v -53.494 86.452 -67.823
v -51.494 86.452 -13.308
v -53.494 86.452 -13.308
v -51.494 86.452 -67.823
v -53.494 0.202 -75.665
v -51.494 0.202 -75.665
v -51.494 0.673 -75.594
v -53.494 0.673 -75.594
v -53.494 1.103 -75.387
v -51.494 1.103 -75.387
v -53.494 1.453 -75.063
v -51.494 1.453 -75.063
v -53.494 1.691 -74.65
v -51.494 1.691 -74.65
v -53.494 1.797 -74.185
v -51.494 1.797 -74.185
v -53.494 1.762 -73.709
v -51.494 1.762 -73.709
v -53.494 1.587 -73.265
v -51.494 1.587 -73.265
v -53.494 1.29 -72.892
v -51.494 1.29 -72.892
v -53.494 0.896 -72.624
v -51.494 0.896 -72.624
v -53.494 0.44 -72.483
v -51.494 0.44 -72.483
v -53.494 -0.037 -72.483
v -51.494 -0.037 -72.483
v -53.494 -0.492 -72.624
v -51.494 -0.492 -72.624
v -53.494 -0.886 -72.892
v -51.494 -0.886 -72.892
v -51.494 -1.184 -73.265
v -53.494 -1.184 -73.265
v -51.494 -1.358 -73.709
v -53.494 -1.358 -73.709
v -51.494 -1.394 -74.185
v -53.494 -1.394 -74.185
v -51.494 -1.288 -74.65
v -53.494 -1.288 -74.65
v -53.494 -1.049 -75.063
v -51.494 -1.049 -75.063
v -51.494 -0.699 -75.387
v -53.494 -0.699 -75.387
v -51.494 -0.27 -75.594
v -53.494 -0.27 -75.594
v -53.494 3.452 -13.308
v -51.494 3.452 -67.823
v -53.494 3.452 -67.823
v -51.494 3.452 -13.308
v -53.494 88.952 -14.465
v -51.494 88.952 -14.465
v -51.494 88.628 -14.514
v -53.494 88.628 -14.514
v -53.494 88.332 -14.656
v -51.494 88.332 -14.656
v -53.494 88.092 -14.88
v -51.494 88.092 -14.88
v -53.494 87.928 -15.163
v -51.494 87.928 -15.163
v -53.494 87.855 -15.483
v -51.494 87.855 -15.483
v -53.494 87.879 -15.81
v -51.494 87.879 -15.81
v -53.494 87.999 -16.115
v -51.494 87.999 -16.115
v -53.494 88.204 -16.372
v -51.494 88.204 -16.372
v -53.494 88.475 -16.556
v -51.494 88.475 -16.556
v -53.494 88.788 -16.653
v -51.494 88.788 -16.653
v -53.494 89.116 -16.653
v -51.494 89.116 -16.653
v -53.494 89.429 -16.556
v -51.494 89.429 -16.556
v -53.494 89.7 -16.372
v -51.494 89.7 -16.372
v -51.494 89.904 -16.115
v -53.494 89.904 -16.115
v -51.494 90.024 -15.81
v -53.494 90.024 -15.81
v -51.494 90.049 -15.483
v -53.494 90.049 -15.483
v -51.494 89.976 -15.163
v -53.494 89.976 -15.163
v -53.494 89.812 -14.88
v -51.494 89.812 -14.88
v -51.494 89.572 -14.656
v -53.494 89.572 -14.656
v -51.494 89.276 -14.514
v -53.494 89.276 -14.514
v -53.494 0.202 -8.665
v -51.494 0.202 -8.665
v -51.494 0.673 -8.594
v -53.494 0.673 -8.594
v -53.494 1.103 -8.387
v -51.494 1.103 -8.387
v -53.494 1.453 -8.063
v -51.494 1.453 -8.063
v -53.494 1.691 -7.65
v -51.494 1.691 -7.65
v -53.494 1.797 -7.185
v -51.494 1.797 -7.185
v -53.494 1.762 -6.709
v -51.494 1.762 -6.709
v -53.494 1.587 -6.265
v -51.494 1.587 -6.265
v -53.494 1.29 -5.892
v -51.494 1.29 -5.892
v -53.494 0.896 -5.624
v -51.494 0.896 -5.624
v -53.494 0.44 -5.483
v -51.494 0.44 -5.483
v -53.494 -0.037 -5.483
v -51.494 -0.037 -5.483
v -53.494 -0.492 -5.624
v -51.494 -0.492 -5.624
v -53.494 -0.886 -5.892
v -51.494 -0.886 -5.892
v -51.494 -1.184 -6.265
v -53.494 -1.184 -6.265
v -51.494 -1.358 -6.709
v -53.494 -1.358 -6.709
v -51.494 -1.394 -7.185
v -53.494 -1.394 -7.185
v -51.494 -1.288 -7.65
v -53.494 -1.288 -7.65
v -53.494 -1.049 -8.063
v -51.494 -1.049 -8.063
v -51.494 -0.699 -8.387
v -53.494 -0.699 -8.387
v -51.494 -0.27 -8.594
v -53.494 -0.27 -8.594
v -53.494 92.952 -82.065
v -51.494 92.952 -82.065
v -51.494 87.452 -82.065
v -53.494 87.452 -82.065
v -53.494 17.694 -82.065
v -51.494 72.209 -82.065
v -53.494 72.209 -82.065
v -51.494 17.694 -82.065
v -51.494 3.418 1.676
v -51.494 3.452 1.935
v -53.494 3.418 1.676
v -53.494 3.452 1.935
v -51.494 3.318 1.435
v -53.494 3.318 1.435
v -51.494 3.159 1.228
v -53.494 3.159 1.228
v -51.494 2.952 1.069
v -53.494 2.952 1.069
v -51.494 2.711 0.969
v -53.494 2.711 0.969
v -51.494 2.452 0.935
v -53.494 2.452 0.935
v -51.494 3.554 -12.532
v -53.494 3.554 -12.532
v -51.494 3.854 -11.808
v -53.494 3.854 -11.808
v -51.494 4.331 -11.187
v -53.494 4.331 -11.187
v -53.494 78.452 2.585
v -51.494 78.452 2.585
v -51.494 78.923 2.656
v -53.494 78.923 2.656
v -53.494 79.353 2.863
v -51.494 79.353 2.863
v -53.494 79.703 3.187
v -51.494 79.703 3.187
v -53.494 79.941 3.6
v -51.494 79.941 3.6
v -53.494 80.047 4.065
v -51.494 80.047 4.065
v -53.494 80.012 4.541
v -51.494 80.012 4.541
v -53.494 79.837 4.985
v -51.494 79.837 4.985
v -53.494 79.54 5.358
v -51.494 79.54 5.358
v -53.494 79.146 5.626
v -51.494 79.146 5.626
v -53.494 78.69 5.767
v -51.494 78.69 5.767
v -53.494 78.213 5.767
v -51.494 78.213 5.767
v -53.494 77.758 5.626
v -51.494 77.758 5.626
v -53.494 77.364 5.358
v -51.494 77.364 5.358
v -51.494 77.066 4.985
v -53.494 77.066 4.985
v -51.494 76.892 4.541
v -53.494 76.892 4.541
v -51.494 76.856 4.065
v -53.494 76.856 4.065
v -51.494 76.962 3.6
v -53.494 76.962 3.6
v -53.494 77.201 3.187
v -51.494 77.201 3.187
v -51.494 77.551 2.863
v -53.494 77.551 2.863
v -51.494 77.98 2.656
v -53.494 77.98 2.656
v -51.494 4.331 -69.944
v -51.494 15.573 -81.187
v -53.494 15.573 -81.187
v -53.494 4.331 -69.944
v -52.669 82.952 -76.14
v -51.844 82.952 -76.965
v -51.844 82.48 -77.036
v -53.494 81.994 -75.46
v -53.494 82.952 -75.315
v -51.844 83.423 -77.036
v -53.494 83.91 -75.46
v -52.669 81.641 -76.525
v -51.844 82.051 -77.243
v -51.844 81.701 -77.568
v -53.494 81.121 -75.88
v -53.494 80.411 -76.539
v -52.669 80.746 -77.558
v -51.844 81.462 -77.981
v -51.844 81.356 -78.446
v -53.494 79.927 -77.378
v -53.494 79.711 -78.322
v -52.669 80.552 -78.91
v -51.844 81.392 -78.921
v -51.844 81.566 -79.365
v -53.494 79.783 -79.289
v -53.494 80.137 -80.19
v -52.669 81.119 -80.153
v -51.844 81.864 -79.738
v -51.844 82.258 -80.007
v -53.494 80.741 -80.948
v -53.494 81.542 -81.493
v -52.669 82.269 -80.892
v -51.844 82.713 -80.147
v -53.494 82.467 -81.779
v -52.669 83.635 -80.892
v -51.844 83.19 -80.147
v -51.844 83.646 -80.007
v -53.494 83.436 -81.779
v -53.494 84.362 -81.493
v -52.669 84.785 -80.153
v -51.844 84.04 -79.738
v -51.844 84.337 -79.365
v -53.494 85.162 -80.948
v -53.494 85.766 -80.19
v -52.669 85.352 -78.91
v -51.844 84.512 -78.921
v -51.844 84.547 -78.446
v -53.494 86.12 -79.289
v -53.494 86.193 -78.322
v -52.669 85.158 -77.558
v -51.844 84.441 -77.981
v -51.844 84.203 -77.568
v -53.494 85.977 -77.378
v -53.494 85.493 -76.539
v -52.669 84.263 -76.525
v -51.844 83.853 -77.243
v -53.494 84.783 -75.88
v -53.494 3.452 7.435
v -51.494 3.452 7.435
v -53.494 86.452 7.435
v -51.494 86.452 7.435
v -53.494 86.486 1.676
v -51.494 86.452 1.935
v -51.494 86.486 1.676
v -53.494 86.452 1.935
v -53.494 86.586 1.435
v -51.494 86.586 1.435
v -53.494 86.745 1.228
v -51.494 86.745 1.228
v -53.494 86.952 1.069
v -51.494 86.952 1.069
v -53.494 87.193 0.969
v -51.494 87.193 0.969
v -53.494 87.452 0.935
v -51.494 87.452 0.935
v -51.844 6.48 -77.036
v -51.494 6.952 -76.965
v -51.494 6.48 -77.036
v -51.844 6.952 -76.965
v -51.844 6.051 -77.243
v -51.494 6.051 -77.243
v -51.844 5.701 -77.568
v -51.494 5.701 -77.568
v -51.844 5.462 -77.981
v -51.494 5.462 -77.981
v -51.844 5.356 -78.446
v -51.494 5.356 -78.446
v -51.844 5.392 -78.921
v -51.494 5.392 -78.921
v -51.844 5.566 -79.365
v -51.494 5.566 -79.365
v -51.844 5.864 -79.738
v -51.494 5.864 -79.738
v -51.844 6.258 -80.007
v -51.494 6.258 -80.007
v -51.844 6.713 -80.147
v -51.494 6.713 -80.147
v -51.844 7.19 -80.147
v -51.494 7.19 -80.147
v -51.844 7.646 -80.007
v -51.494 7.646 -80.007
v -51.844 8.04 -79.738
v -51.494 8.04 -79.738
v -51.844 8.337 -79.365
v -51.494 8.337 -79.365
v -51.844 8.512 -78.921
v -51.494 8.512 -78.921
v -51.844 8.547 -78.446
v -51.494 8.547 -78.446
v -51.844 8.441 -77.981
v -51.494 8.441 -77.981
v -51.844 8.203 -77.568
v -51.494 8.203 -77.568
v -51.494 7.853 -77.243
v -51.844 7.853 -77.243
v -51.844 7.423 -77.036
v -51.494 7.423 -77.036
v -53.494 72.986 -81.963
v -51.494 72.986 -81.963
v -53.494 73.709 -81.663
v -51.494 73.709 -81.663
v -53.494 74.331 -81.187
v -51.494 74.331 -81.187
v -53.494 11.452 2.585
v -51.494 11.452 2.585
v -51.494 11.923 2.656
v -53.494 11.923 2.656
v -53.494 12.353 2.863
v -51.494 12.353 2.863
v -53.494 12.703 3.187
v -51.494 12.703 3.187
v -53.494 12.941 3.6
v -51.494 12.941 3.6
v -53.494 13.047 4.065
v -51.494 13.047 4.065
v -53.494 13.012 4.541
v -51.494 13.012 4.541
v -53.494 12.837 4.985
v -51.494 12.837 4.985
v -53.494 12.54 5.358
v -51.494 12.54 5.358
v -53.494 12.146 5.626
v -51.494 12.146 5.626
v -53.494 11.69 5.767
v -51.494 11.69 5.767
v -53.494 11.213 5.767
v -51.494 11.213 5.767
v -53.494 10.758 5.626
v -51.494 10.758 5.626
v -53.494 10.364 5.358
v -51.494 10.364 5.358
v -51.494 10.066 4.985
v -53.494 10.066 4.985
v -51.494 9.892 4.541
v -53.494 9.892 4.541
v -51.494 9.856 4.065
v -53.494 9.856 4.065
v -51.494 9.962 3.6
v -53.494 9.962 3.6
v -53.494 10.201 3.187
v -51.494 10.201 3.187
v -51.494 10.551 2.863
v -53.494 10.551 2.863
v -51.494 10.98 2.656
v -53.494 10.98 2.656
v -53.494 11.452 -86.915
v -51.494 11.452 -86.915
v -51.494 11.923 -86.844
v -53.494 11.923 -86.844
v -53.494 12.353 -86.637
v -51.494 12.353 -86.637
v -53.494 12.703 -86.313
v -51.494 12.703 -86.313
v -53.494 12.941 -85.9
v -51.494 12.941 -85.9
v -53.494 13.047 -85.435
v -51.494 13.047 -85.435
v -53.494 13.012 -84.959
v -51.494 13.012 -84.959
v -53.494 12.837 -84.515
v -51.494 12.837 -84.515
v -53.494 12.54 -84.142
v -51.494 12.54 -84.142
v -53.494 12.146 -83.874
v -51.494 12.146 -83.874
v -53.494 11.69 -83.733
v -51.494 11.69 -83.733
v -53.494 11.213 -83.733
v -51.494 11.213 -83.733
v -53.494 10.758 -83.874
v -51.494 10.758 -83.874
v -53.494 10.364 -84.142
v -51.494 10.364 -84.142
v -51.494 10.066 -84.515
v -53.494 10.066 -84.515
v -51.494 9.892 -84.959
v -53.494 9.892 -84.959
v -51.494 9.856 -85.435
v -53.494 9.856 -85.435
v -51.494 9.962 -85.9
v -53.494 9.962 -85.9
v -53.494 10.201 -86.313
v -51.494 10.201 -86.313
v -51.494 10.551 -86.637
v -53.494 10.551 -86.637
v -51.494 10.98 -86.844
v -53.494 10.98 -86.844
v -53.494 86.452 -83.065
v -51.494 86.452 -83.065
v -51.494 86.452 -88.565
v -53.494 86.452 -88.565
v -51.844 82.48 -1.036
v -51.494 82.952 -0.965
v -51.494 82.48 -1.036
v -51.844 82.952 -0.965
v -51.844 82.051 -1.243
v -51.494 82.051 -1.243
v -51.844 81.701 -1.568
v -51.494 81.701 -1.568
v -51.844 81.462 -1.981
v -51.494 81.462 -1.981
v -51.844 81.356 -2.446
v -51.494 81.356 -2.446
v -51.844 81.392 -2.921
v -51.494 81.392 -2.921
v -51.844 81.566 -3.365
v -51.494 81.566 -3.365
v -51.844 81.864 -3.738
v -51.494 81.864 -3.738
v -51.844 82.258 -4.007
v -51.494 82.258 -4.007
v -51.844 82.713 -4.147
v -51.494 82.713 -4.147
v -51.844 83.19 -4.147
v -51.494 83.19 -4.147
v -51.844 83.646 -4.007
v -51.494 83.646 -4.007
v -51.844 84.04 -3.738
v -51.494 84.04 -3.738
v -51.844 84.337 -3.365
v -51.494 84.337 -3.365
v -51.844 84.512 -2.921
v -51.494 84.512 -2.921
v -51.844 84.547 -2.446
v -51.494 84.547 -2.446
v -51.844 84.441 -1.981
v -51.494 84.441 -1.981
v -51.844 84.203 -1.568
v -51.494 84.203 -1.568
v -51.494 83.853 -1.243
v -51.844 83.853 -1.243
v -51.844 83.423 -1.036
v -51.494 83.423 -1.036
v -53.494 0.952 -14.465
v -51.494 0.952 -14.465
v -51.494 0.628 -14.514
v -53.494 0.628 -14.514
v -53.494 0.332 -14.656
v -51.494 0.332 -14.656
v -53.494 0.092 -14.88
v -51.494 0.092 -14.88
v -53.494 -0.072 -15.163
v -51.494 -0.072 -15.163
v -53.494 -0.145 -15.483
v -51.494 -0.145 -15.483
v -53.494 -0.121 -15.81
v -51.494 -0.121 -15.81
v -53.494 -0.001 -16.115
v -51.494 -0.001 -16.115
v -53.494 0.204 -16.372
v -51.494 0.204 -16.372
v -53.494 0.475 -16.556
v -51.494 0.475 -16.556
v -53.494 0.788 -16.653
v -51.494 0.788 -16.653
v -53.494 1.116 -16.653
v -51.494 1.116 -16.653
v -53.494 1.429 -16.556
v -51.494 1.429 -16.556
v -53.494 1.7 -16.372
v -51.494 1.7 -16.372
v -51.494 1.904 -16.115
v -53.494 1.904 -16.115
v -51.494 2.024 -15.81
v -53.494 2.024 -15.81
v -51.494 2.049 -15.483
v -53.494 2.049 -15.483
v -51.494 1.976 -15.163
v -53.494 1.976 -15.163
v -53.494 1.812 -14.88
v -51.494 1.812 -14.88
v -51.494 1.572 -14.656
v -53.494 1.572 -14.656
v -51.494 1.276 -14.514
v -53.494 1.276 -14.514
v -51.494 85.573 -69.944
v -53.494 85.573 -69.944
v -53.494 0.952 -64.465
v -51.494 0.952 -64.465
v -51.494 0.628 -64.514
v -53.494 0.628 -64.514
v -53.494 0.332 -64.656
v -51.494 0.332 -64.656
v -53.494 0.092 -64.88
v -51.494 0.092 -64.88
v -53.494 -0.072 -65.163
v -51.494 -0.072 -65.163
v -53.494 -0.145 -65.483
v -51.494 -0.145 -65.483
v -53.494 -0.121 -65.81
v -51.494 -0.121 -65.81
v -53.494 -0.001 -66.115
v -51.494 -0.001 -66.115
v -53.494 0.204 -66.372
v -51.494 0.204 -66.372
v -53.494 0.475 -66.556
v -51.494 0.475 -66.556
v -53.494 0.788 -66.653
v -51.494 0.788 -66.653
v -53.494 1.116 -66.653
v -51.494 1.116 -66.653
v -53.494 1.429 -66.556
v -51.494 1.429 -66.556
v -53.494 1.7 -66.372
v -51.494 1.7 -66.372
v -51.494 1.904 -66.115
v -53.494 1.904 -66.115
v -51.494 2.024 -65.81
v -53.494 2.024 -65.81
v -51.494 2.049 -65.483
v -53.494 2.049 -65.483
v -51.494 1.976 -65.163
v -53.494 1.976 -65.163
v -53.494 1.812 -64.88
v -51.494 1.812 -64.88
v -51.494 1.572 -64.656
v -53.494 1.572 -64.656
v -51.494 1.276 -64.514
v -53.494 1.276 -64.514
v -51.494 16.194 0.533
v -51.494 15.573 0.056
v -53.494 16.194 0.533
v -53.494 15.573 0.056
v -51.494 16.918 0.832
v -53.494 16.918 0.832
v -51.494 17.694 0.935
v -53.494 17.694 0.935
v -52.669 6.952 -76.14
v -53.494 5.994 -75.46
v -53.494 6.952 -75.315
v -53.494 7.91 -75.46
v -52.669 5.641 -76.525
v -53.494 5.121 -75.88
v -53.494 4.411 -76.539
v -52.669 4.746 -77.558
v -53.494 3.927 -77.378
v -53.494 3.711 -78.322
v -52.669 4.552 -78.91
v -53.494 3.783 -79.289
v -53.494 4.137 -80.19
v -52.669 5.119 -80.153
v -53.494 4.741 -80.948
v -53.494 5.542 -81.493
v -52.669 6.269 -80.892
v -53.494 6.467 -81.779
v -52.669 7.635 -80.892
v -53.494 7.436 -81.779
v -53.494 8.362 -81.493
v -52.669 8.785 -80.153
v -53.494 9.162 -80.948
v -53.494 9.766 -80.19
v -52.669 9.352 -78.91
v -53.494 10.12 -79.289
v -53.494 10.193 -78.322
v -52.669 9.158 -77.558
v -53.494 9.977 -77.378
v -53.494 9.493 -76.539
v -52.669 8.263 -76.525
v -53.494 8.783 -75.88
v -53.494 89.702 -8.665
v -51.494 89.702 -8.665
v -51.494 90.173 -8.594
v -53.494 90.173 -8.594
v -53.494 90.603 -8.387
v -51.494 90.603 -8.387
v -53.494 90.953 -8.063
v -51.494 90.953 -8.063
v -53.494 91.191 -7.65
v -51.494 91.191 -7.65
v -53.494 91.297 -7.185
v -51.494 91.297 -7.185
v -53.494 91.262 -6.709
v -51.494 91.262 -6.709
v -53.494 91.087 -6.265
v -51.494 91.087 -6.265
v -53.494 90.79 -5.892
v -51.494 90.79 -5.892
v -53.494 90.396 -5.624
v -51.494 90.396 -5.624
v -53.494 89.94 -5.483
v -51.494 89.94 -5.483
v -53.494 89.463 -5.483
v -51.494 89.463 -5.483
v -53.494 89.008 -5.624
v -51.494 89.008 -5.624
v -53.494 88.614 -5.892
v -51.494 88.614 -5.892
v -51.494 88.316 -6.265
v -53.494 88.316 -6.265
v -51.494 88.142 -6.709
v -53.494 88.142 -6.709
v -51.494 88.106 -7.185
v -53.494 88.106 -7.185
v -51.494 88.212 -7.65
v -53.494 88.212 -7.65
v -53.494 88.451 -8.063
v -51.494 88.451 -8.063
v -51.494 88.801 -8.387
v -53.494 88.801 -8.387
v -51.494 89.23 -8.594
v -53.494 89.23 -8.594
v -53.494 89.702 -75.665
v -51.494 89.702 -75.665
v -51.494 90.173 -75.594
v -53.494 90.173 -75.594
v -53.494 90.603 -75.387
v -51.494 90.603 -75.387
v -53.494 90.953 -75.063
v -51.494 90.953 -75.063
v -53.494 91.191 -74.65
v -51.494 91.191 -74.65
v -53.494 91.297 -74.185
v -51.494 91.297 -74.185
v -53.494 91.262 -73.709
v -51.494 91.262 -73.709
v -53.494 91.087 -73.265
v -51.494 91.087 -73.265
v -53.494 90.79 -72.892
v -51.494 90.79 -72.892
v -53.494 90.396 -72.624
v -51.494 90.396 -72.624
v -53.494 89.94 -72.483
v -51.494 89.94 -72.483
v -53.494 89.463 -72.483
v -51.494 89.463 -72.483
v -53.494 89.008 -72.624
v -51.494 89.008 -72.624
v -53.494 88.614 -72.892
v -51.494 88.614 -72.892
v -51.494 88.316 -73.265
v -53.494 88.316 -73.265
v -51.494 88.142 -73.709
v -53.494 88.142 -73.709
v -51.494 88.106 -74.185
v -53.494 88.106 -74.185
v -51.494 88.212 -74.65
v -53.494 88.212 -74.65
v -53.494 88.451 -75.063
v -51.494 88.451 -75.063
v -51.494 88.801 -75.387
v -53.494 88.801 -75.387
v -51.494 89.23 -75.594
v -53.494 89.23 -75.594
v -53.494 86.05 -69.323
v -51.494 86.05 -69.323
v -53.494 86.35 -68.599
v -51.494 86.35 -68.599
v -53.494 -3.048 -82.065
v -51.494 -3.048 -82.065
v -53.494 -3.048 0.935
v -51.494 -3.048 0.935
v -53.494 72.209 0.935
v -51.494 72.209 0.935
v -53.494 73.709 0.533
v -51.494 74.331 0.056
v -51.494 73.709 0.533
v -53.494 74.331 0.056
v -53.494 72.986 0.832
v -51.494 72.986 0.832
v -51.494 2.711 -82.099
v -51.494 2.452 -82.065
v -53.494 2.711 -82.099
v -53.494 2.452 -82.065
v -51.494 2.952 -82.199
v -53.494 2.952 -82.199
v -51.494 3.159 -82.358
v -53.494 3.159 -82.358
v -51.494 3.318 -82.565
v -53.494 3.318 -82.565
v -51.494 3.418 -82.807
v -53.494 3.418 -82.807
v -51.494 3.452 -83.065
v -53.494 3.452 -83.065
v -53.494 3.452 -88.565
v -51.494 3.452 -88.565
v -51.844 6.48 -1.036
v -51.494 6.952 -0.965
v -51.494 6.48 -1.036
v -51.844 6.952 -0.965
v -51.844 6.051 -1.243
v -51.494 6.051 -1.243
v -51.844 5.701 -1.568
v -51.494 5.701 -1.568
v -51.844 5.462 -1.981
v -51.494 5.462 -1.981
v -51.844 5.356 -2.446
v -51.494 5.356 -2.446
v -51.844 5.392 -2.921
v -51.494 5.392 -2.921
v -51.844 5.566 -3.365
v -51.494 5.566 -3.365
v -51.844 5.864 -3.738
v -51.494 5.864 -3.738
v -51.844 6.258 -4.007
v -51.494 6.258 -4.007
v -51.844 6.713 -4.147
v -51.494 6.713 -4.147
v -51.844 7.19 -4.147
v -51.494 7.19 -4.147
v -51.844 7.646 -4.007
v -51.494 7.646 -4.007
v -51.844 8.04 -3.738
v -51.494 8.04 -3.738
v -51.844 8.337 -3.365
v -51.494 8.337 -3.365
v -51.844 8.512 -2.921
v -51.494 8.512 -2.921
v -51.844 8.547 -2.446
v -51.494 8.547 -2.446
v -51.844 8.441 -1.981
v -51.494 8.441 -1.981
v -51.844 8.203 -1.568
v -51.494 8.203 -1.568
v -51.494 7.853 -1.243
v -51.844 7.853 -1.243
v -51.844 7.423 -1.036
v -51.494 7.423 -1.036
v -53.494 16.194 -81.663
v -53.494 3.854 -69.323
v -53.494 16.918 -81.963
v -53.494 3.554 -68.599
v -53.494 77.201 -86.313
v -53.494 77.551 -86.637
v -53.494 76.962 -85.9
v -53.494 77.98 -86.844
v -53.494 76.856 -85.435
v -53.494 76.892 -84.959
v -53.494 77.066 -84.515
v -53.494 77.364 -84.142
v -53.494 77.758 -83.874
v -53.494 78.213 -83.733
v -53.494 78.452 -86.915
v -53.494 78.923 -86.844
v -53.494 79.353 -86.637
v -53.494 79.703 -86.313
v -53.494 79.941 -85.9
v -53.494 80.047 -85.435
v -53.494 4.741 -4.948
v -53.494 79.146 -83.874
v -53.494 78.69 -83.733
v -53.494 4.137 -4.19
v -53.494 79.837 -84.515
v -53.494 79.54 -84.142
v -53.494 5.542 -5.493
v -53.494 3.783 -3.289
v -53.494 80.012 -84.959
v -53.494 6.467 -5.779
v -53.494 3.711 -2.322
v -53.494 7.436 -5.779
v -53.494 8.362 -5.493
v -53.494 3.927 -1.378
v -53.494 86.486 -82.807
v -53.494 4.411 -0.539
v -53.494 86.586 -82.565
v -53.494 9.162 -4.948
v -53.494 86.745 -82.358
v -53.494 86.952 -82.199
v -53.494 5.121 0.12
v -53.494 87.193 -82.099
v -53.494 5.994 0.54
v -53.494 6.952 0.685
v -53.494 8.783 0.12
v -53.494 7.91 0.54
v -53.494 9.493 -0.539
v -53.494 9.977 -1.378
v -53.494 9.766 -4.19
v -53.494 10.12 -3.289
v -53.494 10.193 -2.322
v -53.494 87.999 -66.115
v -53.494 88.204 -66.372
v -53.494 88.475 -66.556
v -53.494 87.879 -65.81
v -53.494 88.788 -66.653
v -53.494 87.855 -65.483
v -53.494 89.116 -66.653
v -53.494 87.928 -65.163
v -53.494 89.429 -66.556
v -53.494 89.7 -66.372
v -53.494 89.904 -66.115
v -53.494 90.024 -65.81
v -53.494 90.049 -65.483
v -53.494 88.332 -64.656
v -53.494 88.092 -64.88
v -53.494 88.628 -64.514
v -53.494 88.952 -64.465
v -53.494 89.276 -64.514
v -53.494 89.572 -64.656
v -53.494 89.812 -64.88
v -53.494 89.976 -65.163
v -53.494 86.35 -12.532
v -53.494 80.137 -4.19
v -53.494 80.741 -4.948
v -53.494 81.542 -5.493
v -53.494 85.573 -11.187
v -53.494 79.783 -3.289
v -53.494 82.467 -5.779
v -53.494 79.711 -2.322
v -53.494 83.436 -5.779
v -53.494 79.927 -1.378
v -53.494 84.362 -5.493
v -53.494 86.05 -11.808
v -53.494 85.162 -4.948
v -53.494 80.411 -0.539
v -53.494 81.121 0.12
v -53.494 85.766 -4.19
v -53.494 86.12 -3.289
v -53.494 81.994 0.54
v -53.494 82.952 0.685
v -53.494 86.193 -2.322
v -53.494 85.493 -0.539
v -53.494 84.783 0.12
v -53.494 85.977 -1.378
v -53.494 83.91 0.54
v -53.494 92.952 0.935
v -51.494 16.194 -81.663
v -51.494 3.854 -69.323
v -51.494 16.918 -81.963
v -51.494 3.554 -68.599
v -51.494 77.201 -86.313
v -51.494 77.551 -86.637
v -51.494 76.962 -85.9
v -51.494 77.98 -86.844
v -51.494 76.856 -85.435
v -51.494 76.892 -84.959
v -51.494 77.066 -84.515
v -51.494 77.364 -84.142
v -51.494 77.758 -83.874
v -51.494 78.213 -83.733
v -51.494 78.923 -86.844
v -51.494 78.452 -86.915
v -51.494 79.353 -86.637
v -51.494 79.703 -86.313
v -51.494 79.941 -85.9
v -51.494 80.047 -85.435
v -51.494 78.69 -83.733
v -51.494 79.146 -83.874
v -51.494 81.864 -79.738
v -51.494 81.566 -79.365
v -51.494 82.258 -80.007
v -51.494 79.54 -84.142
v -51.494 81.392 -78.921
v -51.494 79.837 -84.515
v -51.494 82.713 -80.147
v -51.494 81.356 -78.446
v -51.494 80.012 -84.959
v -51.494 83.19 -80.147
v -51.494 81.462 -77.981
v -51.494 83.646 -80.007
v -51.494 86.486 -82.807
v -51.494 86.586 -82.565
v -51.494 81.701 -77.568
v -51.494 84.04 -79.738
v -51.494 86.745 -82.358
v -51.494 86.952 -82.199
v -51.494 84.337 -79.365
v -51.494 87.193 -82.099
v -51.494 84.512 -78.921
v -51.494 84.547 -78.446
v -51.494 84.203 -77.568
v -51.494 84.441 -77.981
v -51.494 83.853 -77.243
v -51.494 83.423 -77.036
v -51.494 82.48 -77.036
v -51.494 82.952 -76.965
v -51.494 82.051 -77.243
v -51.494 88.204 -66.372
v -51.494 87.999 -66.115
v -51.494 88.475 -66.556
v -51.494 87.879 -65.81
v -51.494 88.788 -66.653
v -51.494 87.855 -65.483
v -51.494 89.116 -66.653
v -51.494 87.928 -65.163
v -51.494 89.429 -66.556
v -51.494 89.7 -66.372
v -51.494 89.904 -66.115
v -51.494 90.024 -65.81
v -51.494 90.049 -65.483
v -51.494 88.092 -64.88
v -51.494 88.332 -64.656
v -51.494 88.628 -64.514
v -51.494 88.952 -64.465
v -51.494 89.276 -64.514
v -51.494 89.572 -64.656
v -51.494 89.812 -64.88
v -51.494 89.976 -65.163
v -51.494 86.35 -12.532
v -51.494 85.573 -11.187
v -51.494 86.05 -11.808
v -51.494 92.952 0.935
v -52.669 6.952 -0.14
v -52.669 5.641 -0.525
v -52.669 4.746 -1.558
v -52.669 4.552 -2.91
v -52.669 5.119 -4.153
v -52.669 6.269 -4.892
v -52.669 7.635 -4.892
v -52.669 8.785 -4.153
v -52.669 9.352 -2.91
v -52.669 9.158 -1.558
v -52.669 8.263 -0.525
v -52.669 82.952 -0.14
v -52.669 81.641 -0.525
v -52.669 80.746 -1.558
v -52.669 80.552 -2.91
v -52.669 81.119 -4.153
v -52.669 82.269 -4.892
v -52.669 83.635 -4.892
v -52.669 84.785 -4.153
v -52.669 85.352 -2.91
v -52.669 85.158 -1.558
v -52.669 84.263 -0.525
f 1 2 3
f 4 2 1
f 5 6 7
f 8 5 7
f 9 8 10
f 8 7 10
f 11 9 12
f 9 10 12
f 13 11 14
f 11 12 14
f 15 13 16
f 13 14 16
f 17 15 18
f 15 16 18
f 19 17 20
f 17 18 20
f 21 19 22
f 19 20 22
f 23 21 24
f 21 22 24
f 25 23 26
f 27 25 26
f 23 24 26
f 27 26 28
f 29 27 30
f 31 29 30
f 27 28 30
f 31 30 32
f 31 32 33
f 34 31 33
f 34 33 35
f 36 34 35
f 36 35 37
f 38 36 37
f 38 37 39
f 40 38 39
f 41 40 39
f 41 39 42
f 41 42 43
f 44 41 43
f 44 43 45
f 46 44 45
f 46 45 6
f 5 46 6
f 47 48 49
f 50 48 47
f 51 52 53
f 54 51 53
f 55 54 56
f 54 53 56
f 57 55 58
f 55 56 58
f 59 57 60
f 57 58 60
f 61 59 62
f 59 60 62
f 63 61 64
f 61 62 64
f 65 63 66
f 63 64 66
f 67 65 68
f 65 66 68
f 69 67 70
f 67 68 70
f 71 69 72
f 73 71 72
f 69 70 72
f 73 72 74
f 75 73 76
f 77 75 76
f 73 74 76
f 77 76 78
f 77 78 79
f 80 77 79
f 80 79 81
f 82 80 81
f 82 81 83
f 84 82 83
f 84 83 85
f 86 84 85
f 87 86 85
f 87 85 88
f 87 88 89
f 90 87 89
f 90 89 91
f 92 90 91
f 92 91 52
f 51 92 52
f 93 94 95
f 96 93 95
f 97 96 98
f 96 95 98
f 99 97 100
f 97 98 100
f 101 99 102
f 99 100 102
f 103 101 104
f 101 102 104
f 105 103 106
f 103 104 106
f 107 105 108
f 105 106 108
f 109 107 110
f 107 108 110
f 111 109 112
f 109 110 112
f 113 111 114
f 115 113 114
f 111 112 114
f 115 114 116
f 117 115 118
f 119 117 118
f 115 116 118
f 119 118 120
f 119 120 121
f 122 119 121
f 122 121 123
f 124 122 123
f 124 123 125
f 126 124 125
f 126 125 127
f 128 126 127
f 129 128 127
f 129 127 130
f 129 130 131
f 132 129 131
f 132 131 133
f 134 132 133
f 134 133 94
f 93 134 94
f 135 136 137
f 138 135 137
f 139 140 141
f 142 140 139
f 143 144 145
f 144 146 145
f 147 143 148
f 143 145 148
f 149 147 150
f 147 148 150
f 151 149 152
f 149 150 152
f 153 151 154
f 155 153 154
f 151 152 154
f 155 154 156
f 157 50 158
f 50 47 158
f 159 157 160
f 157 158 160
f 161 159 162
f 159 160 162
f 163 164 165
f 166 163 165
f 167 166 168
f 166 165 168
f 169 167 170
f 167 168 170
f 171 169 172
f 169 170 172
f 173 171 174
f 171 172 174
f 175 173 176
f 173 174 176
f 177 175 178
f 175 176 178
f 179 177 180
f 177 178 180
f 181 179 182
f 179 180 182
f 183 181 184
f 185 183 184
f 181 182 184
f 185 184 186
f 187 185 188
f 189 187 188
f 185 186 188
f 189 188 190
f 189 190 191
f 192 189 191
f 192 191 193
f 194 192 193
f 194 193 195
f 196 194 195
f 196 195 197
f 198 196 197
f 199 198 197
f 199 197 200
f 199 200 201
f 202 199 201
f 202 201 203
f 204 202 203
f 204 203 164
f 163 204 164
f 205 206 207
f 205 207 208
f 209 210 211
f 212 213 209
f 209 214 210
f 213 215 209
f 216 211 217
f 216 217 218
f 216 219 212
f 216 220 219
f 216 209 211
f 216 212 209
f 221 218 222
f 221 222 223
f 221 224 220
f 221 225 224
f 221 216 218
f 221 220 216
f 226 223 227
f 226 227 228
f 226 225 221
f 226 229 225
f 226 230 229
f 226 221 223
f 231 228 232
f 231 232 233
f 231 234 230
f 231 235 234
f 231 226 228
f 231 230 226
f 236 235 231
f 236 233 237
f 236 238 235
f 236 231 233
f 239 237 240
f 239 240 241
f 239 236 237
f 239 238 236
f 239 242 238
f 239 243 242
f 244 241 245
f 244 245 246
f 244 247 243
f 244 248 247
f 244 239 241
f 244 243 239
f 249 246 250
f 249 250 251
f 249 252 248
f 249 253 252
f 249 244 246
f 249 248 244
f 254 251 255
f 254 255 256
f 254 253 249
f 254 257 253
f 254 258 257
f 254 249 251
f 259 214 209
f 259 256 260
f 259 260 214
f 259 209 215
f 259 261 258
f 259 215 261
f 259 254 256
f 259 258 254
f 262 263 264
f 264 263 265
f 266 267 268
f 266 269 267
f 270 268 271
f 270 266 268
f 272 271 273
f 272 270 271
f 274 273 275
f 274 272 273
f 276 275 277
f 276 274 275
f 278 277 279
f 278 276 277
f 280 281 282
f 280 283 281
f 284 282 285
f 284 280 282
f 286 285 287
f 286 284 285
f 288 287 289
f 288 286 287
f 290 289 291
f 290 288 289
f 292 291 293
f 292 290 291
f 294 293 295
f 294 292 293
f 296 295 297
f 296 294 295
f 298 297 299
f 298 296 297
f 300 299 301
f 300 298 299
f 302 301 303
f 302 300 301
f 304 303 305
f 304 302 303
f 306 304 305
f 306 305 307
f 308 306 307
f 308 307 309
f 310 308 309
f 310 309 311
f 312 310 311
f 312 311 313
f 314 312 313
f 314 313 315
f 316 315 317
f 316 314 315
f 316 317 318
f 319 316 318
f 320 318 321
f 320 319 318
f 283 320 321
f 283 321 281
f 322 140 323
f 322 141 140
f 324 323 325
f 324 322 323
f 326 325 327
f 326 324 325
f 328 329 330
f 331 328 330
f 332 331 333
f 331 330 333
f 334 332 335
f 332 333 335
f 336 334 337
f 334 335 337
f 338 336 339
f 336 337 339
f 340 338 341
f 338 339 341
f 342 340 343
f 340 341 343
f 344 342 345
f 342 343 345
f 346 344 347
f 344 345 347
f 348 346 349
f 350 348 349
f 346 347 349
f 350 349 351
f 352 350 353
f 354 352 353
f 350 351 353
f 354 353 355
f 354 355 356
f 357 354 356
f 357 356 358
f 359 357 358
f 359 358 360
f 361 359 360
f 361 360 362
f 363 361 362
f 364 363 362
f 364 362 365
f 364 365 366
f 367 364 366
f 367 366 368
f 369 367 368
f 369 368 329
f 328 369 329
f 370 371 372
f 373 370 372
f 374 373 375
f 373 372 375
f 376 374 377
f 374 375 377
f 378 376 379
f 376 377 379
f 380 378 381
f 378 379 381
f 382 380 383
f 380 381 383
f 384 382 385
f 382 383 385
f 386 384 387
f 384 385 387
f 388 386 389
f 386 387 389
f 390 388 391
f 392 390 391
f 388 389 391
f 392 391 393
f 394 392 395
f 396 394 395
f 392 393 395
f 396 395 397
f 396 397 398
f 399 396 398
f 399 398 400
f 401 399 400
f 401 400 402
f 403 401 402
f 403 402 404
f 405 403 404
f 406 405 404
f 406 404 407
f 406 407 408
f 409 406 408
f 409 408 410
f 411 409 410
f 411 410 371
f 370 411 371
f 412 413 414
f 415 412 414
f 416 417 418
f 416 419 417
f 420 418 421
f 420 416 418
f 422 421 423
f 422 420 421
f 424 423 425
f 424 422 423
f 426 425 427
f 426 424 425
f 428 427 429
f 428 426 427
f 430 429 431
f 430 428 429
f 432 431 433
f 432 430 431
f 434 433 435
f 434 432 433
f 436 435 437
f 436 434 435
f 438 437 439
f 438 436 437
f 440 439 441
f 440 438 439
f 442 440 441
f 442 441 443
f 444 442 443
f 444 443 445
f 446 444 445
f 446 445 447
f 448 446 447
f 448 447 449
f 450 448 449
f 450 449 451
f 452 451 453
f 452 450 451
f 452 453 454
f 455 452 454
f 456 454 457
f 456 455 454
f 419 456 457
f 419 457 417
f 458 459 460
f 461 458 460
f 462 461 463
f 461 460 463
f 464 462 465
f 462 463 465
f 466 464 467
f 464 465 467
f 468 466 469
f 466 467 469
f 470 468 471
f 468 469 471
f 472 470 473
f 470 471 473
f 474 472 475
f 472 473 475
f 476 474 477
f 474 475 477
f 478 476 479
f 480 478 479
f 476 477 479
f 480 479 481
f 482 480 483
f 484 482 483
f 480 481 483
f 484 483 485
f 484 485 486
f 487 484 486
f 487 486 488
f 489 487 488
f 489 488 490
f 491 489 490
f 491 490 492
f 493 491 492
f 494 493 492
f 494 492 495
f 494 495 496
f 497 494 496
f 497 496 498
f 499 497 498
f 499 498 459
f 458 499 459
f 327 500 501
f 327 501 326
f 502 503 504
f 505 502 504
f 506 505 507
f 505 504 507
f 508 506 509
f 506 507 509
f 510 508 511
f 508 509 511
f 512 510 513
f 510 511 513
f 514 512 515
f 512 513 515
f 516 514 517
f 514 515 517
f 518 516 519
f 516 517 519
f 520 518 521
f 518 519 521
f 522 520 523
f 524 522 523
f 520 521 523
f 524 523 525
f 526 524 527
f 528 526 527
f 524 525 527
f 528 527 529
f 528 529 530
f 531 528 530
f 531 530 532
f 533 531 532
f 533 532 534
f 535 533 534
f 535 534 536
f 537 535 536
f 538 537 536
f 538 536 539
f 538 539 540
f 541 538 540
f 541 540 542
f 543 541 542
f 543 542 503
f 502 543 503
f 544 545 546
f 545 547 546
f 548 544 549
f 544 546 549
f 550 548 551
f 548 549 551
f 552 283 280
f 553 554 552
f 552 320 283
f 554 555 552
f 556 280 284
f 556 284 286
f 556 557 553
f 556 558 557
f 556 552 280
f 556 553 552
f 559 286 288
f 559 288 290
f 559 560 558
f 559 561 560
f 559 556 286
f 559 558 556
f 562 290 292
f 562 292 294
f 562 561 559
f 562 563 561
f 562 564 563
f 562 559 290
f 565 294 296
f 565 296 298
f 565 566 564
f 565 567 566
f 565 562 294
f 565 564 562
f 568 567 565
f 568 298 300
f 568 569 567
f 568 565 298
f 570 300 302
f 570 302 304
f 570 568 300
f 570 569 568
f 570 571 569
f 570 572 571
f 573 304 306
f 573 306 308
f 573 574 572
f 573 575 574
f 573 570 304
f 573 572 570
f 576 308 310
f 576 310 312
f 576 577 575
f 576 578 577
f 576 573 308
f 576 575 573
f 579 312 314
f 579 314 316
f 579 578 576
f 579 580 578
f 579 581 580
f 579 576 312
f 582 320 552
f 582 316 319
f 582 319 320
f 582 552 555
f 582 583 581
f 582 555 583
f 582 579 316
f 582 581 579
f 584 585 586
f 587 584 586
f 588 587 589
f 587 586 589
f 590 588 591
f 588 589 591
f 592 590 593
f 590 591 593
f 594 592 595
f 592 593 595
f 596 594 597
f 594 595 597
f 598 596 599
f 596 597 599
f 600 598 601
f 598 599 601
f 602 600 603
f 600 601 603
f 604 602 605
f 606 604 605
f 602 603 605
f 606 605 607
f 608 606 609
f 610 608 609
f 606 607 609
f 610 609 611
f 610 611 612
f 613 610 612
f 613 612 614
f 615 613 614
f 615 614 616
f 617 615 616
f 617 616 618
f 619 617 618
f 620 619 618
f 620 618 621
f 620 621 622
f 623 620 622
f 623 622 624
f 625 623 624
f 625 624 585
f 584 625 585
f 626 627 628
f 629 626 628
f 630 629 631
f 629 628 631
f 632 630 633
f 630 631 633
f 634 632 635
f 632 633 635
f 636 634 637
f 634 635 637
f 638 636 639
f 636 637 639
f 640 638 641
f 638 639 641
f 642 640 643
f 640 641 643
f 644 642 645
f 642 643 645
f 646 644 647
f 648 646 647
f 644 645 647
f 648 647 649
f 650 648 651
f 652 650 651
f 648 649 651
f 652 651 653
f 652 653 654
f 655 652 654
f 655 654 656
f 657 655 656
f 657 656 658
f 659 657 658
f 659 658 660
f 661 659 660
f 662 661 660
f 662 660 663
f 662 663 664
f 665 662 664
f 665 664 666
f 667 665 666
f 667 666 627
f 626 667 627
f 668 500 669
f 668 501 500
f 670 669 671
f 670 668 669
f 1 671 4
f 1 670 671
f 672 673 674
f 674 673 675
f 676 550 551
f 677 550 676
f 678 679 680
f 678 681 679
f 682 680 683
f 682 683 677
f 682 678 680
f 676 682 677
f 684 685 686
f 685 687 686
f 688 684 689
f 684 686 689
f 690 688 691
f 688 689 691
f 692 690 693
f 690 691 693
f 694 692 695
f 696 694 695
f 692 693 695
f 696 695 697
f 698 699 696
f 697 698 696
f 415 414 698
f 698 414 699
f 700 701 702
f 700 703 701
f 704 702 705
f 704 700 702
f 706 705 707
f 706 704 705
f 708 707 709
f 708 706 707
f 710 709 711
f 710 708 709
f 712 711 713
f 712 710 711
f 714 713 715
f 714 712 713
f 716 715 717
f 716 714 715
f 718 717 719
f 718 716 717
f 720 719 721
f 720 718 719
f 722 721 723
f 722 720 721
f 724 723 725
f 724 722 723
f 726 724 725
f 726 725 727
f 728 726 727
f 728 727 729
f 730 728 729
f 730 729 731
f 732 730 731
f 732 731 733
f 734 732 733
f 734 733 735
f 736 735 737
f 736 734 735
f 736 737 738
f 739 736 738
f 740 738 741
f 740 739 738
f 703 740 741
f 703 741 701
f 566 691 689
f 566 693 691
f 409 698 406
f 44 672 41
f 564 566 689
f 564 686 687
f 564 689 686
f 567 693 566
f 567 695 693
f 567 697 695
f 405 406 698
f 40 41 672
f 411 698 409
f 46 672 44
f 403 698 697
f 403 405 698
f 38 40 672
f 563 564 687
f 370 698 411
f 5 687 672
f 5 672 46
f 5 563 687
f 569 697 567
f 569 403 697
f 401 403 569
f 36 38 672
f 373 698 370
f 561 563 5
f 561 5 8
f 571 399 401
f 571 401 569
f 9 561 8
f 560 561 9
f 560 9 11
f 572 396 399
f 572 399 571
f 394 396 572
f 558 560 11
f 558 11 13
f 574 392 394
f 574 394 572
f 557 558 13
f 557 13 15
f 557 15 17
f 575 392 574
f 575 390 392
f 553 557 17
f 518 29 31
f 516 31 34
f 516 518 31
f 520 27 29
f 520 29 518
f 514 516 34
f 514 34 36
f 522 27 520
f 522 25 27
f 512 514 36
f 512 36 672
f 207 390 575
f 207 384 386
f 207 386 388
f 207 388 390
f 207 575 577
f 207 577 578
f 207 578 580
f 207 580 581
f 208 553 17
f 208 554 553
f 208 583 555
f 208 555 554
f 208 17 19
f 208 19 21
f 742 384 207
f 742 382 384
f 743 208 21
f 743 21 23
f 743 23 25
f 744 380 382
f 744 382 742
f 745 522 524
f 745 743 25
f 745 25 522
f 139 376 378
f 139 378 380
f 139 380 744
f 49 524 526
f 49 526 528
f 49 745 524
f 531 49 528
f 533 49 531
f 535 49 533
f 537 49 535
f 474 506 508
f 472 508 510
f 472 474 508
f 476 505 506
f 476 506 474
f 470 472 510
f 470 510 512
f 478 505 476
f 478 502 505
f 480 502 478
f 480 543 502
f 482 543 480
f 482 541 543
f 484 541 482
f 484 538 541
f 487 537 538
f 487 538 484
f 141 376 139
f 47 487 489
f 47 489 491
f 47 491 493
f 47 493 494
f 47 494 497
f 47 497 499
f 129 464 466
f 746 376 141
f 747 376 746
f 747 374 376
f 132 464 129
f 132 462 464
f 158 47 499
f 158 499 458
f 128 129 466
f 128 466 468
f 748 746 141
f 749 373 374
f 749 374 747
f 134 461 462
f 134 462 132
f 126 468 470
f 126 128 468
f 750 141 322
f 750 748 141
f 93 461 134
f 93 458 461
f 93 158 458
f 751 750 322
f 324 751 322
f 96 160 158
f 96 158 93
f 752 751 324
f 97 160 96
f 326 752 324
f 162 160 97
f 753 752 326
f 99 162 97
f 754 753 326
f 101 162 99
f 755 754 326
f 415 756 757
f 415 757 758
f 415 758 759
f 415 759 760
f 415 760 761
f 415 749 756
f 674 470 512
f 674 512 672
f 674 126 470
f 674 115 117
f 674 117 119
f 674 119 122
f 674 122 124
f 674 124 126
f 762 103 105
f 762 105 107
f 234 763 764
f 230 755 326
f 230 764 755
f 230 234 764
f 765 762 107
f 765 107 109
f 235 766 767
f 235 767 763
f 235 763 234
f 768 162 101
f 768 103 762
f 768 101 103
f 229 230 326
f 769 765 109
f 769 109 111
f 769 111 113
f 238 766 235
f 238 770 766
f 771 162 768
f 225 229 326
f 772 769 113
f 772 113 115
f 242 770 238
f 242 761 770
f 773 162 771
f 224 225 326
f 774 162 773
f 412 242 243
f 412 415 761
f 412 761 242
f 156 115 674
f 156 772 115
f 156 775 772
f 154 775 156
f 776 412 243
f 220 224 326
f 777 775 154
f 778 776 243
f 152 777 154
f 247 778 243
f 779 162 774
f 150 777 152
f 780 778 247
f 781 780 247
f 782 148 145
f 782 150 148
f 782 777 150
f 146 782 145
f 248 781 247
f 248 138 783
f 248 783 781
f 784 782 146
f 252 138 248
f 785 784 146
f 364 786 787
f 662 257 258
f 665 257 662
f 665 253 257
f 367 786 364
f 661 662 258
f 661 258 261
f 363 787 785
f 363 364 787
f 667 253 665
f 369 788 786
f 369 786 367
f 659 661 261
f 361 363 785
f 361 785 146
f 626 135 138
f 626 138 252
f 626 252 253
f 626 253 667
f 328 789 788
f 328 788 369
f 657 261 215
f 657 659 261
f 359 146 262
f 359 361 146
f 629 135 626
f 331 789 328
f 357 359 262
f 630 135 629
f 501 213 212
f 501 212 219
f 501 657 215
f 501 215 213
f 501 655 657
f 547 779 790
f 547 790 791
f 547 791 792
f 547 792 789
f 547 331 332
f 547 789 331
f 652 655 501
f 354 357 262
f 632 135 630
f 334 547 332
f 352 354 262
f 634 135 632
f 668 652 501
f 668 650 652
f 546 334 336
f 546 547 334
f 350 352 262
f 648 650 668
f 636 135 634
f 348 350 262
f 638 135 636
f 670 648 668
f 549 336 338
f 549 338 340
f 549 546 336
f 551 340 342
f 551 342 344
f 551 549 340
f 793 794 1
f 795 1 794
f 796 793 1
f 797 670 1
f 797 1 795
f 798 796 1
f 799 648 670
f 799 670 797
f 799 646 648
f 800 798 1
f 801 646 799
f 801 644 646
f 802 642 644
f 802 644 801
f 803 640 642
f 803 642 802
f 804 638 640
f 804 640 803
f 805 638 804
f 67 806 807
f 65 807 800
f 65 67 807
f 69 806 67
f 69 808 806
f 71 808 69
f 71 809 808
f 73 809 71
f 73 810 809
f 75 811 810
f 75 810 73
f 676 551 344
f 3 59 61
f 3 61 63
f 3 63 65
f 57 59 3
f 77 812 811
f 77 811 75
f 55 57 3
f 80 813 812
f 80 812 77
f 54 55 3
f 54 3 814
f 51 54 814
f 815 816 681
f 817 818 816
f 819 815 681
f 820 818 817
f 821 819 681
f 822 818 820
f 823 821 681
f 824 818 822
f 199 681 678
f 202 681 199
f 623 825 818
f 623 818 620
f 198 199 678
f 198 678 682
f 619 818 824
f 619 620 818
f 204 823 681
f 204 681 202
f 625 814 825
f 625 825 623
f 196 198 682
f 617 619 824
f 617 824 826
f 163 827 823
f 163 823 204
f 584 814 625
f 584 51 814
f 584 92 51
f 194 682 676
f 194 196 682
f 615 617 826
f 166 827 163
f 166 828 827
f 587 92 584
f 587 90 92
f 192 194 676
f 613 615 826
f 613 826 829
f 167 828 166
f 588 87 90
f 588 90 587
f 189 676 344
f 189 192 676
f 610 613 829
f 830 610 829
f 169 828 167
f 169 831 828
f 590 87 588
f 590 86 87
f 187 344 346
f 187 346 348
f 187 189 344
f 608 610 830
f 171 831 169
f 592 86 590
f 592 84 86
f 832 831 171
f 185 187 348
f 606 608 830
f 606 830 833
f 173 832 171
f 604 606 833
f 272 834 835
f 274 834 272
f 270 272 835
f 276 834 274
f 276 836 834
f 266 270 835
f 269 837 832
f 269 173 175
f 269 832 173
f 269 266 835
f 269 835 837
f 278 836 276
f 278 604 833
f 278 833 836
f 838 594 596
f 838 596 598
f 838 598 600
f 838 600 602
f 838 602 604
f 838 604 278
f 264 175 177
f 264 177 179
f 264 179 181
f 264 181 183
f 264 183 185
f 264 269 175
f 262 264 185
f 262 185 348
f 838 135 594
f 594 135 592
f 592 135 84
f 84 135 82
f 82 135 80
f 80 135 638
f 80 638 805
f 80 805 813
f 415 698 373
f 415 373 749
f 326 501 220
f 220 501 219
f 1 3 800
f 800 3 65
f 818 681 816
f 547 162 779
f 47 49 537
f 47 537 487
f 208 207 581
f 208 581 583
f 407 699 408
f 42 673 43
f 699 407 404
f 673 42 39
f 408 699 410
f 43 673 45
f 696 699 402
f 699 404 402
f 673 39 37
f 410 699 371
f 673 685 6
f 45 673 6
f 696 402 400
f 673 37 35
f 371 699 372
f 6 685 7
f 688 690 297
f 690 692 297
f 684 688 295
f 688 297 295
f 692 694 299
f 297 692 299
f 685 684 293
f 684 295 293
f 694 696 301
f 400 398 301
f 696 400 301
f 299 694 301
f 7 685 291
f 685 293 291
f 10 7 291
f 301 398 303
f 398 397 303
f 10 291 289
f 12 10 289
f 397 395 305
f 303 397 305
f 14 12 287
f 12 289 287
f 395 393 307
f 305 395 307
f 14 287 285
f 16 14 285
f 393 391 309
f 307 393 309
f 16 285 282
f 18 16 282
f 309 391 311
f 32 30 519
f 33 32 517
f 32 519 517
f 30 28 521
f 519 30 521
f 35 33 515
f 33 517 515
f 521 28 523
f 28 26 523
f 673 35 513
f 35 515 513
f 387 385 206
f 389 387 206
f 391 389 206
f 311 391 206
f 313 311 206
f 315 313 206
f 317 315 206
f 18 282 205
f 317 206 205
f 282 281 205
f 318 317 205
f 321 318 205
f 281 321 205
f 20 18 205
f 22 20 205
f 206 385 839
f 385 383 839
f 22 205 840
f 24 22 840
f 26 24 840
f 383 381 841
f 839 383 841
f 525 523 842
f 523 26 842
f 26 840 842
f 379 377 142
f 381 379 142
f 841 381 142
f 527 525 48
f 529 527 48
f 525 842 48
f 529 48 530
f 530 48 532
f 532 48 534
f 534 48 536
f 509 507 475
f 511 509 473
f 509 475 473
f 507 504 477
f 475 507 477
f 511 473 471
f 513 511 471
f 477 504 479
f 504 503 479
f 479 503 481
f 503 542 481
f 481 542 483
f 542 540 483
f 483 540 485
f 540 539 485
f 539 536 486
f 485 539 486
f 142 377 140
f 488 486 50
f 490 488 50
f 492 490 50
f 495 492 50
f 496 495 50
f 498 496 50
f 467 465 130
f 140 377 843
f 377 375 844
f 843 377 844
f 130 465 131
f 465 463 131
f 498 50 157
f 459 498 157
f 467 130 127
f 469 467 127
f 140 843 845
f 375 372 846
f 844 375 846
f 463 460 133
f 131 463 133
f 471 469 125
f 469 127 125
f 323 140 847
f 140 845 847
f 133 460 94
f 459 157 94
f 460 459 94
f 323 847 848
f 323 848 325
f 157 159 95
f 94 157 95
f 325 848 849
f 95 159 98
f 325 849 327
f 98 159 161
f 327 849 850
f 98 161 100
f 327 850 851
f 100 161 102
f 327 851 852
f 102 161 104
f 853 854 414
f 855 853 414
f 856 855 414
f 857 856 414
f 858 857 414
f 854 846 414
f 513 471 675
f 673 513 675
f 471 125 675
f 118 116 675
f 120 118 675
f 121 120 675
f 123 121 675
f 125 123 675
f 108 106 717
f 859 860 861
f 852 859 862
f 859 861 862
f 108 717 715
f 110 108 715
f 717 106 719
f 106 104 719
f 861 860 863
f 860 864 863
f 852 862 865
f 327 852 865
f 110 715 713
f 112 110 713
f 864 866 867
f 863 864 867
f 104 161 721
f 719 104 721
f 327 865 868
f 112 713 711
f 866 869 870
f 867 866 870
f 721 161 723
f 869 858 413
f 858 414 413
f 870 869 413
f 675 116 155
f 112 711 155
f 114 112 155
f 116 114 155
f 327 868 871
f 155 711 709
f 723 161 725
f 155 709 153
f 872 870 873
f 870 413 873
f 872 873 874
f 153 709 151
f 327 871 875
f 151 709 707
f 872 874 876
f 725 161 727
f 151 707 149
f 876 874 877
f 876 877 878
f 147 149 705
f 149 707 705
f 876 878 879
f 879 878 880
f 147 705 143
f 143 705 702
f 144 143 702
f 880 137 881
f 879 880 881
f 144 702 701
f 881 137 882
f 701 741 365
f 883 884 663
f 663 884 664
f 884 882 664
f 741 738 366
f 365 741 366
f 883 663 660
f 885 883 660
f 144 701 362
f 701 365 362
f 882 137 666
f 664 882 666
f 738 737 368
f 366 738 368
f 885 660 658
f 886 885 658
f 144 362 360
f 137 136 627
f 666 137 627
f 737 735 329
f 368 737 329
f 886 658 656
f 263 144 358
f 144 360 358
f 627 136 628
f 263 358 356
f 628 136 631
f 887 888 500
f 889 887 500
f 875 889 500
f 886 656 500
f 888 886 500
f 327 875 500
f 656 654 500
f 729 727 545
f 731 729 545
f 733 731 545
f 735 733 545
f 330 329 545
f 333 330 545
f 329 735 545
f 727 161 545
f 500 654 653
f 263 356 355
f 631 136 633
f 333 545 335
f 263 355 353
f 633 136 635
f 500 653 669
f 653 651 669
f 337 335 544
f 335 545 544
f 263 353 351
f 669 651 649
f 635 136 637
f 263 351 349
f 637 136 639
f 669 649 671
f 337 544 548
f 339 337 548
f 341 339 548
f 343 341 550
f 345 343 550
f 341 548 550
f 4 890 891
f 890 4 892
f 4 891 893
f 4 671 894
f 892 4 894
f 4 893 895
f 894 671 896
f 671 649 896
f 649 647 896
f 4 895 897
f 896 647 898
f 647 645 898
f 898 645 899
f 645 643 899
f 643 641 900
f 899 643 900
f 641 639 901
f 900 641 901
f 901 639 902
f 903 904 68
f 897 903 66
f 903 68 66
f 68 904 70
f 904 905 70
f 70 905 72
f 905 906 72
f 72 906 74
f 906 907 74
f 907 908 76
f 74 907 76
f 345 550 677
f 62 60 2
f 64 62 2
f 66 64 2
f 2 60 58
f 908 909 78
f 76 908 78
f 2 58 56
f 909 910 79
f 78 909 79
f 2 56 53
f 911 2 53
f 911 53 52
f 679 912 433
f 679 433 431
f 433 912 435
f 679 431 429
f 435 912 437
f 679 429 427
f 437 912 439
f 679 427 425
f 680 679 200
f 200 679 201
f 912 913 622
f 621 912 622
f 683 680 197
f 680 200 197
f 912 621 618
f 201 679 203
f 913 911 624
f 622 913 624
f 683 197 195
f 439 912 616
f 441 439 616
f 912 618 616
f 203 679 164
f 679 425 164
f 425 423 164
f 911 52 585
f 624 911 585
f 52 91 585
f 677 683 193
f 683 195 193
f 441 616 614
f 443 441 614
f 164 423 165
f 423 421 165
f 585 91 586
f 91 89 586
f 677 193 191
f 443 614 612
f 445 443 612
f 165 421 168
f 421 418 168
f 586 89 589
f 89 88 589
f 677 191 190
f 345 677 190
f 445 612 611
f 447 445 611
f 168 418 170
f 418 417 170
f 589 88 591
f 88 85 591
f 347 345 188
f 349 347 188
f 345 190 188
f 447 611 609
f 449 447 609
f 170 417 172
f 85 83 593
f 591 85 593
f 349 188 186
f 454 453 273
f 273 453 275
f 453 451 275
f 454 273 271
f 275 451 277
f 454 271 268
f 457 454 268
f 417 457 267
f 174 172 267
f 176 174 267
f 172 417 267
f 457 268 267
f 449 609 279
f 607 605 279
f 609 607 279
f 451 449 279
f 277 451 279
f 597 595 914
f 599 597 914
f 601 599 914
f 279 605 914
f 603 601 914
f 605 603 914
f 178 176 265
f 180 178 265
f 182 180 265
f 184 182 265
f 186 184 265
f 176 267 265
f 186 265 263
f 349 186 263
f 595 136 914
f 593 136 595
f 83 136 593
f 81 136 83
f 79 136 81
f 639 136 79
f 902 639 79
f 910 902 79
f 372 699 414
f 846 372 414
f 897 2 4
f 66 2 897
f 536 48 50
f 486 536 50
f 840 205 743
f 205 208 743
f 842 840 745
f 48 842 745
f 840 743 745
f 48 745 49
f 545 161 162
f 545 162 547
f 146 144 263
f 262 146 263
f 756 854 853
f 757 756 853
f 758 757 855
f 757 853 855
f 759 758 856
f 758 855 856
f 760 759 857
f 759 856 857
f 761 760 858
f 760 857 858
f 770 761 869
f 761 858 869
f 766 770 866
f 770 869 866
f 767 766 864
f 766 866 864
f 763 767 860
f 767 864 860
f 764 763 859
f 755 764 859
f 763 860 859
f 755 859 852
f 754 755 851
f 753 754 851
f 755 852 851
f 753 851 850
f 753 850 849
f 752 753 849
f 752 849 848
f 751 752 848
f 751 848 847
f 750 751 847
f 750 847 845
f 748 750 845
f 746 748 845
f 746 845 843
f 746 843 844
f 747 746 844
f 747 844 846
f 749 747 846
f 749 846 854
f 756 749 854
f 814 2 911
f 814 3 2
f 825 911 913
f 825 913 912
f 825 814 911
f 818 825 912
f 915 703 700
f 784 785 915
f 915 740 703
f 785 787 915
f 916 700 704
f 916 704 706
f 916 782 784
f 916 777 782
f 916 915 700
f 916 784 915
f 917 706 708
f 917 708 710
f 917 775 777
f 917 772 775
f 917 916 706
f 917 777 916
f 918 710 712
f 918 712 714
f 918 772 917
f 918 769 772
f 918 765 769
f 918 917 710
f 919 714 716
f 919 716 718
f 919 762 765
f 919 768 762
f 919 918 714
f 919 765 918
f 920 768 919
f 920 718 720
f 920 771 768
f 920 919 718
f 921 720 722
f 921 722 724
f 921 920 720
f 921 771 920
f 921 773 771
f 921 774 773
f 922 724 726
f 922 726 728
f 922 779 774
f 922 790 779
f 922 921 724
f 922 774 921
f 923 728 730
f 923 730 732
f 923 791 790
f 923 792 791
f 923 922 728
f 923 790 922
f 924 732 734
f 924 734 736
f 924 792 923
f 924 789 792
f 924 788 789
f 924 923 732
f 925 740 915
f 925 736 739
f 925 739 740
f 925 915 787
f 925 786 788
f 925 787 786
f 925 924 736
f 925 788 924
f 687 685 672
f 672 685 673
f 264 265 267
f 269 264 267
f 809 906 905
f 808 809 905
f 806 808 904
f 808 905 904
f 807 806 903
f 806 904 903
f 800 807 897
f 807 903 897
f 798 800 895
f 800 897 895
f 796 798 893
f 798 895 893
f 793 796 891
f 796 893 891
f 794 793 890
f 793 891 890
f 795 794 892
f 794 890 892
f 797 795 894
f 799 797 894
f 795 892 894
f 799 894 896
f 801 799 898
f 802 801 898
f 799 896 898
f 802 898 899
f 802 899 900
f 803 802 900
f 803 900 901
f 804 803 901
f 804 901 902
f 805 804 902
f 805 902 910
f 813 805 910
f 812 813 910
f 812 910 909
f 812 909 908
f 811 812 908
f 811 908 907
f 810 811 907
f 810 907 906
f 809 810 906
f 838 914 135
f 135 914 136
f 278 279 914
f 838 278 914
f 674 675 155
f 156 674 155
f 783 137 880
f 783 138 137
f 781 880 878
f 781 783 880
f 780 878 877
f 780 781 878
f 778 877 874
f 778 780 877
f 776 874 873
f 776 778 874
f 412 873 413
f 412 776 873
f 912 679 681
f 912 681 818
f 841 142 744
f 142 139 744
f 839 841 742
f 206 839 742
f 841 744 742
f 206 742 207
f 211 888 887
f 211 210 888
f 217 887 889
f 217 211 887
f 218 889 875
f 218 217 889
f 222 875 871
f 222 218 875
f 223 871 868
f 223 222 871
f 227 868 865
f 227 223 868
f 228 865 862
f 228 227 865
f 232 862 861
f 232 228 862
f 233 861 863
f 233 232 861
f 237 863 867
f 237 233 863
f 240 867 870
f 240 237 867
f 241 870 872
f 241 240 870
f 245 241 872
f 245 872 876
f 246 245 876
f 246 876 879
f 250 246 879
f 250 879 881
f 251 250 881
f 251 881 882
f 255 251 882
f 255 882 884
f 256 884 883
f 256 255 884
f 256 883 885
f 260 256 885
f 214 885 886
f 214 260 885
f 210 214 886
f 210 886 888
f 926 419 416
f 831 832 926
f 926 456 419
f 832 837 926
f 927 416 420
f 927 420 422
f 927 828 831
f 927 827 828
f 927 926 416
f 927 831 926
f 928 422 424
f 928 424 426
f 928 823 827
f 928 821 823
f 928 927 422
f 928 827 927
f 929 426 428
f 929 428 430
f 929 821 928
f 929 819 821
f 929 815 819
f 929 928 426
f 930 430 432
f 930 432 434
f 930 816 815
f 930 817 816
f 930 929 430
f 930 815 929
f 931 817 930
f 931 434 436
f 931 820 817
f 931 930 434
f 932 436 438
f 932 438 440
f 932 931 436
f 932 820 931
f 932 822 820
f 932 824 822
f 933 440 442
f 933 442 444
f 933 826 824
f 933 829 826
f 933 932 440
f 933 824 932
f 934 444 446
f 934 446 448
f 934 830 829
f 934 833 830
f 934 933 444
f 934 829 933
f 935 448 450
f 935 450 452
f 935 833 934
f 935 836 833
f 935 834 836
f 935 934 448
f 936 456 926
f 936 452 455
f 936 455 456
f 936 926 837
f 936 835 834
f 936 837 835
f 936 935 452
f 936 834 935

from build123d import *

# Parameters (mm, degrees)
BOSS_EXTRUDE2_DEPTH                          = 2
F_3_2_3_2_DIAMETER_HOLE3_D                   = 3.2
CSK_FOR_M3_FLAT_COUNTERSUNK_HEAD_SCR_2_COUNT = 2
CSK_FOR_M3_FLAT_COUNTERSUNK_HEAD_SCR_2_PITCH = 76
CSK_FOR_M3_FLAT_COUNTERSUNK_HEAD_SCR_3_COUNT = 2
CSK_FOR_M3_FLAT_COUNTERSUNK_HEAD_SCR_3_PITCH = 107.48023074
CSK_FOR_M3_FLAT_COUNTERSUNK_HEAD_SCR_4_COUNT = 2
CSK_FOR_M3_FLAT_COUNTERSUNK_HEAD_SCR_4_PITCH = 76
F_2_2_2_2_DIAMETER_HOLE1_D                   = 2.2
FILLET1_R                                    = 3
FILLET2_R                                    = 1


with BuildPart() as part:
    # Sketch2 → Boss-Extrude2 (new body)
    with BuildSketch(Plane.ZY.offset(51.493641502)):
        Polygon((0.93465612, 3.45185693), (7.43465612, 3.45185693), (7.43465612, 86.45185693), (0.93465612, 86.45185693), (0.93465612, 92.95185693), (-82.06534388, 92.95185693), (-82.06534388, 86.45185693), (-88.56534388, 86.45185693), (-88.56534388, 3.45185693), (-82.06534388, 3.45185693), (-82.06534388, -3.04814307), (0.93465612, -3.04814307), align=None)
        Polygon((-82.06534388, 73.45185693), (-82.06534388, 16.45185693), (-69.06534388, 3.45185693), (-12.06534388, 3.45185693), (0.93465612, 16.45185693), (0.93465612, 73.45185693), (-12.06534388, 86.45185693), (-69.06534388, 86.45185693), align=None, mode=Mode.SUBTRACT)
    extrude(amount=BOSS_EXTRUDE2_DEPTH)

    # Ø3.2 (3.2) Diameter Hole3 (through all)
    with Locations(Plane.ZY.offset(53.493641502)):
        with Locations((-74.06534388, 0.20185693), (-85.31534388, 11.45185693), (-85.31534388, 78.45185693), (-74.06534388, 89.70185693), (-7.06534388, 89.70185693), (4.18465612, 78.45185693), (4.18465612, 11.45185693), (-7.06534388, 0.20185693)):
            Hole(F_3_2_3_2_DIAMETER_HOLE3_D / 2)

    # Sketch24 → CSK for M3 Flat Countersunk Head Screw5 (revolve, cut)
    with BuildSketch(Plane(origin=(-53.493641502, 6.95185693, -78.56534388), x_dir=(0, 0, 1), z_dir=(0, 1, 0))):
        Polygon((0, 0), (0, 2), (1.6, 2), (1.6, 1.65), (3.25, 0), align=None)
    csk_for_m3_flat_countersunk_head_screw5 = revolve(axis=Axis((-59.843641502, 6.95185693, -78.56534388), (1, 0, 0)), mode=Mode.SUBTRACT)

    # CSK for M3 Flat Countersunk Head Scr 2: CSK for M3 Flat Countersunk Head Screw5 ×2
    with Locations(*[(0, i * CSK_FOR_M3_FLAT_COUNTERSUNK_HEAD_SCR_2_PITCH, 0) for i in range(1, CSK_FOR_M3_FLAT_COUNTERSUNK_HEAD_SCR_2_COUNT)]):
        add(csk_for_m3_flat_countersunk_head_screw5, mode=Mode.SUBTRACT)

    # CSK for M3 Flat Countersunk Head Scr 3: CSK for M3 Flat Countersunk Head Screw5 ×2
    with Locations(*[Vector(0, 0.7071067811865478, 0.7071067811865472) * (i * CSK_FOR_M3_FLAT_COUNTERSUNK_HEAD_SCR_3_PITCH) for i in range(1, CSK_FOR_M3_FLAT_COUNTERSUNK_HEAD_SCR_3_COUNT)]):
        add(csk_for_m3_flat_countersunk_head_screw5, mode=Mode.SUBTRACT)

    # CSK for M3 Flat Countersunk Head Scr 4: CSK for M3 Flat Countersunk Head Screw5 ×2
    with Locations(*[(0, 0, i * CSK_FOR_M3_FLAT_COUNTERSUNK_HEAD_SCR_4_PITCH) for i in range(1, CSK_FOR_M3_FLAT_COUNTERSUNK_HEAD_SCR_4_COUNT)]):
        add(csk_for_m3_flat_countersunk_head_screw5, mode=Mode.SUBTRACT)

    # Ø2.2 (2.2) Diameter Hole1 (through all)
    with Locations(Plane(origin=(-53.493641502, 88.95185693, -65.56534388), x_dir=(0, 0, -1), z_dir=(-1, 0, 0))):
        with Locations((0, 0), (-50, 0), (0, 88), (-50, 88)):
            Hole(F_2_2_2_2_DIAMETER_HOLE1_D / 2)

    # Fillet1
    fillet1_edges = [part.edges().sort_by_distance(p)[0] for p in [
        (-52.493641502, 86.45185693, -69.06534388),
        (-52.493641502, 73.45185693, -82.06534388),
        (-52.493641502, 16.45185693, -82.06534388),
        (-52.493641502, 3.45185693, -69.06534388),
        (-52.493641502, 3.45185693, -12.06534388),
        (-52.493641502, 16.45185693, 0.93465612),
        (-52.493641502, 73.45185693, 0.93465612),
        (-52.493641502, 86.45185693, -12.06534388),
    ]]
    fillet(fillet1_edges, radius=FILLET1_R)

    # Fillet2
    fillet2_edges = [part.edges().sort_by_distance(p)[0] for p in [
        (-52.493641502, 3.45185693, -82.06534388),
        (-52.493641502, 86.45185693, -82.06534388),
        (-52.493641502, 86.45185693, 0.93465612),
        (-52.493641502, 3.45185693, 0.93465612),
    ]]
    fillet(fillet2_edges, radius=FILLET2_R)


solid = part.part
